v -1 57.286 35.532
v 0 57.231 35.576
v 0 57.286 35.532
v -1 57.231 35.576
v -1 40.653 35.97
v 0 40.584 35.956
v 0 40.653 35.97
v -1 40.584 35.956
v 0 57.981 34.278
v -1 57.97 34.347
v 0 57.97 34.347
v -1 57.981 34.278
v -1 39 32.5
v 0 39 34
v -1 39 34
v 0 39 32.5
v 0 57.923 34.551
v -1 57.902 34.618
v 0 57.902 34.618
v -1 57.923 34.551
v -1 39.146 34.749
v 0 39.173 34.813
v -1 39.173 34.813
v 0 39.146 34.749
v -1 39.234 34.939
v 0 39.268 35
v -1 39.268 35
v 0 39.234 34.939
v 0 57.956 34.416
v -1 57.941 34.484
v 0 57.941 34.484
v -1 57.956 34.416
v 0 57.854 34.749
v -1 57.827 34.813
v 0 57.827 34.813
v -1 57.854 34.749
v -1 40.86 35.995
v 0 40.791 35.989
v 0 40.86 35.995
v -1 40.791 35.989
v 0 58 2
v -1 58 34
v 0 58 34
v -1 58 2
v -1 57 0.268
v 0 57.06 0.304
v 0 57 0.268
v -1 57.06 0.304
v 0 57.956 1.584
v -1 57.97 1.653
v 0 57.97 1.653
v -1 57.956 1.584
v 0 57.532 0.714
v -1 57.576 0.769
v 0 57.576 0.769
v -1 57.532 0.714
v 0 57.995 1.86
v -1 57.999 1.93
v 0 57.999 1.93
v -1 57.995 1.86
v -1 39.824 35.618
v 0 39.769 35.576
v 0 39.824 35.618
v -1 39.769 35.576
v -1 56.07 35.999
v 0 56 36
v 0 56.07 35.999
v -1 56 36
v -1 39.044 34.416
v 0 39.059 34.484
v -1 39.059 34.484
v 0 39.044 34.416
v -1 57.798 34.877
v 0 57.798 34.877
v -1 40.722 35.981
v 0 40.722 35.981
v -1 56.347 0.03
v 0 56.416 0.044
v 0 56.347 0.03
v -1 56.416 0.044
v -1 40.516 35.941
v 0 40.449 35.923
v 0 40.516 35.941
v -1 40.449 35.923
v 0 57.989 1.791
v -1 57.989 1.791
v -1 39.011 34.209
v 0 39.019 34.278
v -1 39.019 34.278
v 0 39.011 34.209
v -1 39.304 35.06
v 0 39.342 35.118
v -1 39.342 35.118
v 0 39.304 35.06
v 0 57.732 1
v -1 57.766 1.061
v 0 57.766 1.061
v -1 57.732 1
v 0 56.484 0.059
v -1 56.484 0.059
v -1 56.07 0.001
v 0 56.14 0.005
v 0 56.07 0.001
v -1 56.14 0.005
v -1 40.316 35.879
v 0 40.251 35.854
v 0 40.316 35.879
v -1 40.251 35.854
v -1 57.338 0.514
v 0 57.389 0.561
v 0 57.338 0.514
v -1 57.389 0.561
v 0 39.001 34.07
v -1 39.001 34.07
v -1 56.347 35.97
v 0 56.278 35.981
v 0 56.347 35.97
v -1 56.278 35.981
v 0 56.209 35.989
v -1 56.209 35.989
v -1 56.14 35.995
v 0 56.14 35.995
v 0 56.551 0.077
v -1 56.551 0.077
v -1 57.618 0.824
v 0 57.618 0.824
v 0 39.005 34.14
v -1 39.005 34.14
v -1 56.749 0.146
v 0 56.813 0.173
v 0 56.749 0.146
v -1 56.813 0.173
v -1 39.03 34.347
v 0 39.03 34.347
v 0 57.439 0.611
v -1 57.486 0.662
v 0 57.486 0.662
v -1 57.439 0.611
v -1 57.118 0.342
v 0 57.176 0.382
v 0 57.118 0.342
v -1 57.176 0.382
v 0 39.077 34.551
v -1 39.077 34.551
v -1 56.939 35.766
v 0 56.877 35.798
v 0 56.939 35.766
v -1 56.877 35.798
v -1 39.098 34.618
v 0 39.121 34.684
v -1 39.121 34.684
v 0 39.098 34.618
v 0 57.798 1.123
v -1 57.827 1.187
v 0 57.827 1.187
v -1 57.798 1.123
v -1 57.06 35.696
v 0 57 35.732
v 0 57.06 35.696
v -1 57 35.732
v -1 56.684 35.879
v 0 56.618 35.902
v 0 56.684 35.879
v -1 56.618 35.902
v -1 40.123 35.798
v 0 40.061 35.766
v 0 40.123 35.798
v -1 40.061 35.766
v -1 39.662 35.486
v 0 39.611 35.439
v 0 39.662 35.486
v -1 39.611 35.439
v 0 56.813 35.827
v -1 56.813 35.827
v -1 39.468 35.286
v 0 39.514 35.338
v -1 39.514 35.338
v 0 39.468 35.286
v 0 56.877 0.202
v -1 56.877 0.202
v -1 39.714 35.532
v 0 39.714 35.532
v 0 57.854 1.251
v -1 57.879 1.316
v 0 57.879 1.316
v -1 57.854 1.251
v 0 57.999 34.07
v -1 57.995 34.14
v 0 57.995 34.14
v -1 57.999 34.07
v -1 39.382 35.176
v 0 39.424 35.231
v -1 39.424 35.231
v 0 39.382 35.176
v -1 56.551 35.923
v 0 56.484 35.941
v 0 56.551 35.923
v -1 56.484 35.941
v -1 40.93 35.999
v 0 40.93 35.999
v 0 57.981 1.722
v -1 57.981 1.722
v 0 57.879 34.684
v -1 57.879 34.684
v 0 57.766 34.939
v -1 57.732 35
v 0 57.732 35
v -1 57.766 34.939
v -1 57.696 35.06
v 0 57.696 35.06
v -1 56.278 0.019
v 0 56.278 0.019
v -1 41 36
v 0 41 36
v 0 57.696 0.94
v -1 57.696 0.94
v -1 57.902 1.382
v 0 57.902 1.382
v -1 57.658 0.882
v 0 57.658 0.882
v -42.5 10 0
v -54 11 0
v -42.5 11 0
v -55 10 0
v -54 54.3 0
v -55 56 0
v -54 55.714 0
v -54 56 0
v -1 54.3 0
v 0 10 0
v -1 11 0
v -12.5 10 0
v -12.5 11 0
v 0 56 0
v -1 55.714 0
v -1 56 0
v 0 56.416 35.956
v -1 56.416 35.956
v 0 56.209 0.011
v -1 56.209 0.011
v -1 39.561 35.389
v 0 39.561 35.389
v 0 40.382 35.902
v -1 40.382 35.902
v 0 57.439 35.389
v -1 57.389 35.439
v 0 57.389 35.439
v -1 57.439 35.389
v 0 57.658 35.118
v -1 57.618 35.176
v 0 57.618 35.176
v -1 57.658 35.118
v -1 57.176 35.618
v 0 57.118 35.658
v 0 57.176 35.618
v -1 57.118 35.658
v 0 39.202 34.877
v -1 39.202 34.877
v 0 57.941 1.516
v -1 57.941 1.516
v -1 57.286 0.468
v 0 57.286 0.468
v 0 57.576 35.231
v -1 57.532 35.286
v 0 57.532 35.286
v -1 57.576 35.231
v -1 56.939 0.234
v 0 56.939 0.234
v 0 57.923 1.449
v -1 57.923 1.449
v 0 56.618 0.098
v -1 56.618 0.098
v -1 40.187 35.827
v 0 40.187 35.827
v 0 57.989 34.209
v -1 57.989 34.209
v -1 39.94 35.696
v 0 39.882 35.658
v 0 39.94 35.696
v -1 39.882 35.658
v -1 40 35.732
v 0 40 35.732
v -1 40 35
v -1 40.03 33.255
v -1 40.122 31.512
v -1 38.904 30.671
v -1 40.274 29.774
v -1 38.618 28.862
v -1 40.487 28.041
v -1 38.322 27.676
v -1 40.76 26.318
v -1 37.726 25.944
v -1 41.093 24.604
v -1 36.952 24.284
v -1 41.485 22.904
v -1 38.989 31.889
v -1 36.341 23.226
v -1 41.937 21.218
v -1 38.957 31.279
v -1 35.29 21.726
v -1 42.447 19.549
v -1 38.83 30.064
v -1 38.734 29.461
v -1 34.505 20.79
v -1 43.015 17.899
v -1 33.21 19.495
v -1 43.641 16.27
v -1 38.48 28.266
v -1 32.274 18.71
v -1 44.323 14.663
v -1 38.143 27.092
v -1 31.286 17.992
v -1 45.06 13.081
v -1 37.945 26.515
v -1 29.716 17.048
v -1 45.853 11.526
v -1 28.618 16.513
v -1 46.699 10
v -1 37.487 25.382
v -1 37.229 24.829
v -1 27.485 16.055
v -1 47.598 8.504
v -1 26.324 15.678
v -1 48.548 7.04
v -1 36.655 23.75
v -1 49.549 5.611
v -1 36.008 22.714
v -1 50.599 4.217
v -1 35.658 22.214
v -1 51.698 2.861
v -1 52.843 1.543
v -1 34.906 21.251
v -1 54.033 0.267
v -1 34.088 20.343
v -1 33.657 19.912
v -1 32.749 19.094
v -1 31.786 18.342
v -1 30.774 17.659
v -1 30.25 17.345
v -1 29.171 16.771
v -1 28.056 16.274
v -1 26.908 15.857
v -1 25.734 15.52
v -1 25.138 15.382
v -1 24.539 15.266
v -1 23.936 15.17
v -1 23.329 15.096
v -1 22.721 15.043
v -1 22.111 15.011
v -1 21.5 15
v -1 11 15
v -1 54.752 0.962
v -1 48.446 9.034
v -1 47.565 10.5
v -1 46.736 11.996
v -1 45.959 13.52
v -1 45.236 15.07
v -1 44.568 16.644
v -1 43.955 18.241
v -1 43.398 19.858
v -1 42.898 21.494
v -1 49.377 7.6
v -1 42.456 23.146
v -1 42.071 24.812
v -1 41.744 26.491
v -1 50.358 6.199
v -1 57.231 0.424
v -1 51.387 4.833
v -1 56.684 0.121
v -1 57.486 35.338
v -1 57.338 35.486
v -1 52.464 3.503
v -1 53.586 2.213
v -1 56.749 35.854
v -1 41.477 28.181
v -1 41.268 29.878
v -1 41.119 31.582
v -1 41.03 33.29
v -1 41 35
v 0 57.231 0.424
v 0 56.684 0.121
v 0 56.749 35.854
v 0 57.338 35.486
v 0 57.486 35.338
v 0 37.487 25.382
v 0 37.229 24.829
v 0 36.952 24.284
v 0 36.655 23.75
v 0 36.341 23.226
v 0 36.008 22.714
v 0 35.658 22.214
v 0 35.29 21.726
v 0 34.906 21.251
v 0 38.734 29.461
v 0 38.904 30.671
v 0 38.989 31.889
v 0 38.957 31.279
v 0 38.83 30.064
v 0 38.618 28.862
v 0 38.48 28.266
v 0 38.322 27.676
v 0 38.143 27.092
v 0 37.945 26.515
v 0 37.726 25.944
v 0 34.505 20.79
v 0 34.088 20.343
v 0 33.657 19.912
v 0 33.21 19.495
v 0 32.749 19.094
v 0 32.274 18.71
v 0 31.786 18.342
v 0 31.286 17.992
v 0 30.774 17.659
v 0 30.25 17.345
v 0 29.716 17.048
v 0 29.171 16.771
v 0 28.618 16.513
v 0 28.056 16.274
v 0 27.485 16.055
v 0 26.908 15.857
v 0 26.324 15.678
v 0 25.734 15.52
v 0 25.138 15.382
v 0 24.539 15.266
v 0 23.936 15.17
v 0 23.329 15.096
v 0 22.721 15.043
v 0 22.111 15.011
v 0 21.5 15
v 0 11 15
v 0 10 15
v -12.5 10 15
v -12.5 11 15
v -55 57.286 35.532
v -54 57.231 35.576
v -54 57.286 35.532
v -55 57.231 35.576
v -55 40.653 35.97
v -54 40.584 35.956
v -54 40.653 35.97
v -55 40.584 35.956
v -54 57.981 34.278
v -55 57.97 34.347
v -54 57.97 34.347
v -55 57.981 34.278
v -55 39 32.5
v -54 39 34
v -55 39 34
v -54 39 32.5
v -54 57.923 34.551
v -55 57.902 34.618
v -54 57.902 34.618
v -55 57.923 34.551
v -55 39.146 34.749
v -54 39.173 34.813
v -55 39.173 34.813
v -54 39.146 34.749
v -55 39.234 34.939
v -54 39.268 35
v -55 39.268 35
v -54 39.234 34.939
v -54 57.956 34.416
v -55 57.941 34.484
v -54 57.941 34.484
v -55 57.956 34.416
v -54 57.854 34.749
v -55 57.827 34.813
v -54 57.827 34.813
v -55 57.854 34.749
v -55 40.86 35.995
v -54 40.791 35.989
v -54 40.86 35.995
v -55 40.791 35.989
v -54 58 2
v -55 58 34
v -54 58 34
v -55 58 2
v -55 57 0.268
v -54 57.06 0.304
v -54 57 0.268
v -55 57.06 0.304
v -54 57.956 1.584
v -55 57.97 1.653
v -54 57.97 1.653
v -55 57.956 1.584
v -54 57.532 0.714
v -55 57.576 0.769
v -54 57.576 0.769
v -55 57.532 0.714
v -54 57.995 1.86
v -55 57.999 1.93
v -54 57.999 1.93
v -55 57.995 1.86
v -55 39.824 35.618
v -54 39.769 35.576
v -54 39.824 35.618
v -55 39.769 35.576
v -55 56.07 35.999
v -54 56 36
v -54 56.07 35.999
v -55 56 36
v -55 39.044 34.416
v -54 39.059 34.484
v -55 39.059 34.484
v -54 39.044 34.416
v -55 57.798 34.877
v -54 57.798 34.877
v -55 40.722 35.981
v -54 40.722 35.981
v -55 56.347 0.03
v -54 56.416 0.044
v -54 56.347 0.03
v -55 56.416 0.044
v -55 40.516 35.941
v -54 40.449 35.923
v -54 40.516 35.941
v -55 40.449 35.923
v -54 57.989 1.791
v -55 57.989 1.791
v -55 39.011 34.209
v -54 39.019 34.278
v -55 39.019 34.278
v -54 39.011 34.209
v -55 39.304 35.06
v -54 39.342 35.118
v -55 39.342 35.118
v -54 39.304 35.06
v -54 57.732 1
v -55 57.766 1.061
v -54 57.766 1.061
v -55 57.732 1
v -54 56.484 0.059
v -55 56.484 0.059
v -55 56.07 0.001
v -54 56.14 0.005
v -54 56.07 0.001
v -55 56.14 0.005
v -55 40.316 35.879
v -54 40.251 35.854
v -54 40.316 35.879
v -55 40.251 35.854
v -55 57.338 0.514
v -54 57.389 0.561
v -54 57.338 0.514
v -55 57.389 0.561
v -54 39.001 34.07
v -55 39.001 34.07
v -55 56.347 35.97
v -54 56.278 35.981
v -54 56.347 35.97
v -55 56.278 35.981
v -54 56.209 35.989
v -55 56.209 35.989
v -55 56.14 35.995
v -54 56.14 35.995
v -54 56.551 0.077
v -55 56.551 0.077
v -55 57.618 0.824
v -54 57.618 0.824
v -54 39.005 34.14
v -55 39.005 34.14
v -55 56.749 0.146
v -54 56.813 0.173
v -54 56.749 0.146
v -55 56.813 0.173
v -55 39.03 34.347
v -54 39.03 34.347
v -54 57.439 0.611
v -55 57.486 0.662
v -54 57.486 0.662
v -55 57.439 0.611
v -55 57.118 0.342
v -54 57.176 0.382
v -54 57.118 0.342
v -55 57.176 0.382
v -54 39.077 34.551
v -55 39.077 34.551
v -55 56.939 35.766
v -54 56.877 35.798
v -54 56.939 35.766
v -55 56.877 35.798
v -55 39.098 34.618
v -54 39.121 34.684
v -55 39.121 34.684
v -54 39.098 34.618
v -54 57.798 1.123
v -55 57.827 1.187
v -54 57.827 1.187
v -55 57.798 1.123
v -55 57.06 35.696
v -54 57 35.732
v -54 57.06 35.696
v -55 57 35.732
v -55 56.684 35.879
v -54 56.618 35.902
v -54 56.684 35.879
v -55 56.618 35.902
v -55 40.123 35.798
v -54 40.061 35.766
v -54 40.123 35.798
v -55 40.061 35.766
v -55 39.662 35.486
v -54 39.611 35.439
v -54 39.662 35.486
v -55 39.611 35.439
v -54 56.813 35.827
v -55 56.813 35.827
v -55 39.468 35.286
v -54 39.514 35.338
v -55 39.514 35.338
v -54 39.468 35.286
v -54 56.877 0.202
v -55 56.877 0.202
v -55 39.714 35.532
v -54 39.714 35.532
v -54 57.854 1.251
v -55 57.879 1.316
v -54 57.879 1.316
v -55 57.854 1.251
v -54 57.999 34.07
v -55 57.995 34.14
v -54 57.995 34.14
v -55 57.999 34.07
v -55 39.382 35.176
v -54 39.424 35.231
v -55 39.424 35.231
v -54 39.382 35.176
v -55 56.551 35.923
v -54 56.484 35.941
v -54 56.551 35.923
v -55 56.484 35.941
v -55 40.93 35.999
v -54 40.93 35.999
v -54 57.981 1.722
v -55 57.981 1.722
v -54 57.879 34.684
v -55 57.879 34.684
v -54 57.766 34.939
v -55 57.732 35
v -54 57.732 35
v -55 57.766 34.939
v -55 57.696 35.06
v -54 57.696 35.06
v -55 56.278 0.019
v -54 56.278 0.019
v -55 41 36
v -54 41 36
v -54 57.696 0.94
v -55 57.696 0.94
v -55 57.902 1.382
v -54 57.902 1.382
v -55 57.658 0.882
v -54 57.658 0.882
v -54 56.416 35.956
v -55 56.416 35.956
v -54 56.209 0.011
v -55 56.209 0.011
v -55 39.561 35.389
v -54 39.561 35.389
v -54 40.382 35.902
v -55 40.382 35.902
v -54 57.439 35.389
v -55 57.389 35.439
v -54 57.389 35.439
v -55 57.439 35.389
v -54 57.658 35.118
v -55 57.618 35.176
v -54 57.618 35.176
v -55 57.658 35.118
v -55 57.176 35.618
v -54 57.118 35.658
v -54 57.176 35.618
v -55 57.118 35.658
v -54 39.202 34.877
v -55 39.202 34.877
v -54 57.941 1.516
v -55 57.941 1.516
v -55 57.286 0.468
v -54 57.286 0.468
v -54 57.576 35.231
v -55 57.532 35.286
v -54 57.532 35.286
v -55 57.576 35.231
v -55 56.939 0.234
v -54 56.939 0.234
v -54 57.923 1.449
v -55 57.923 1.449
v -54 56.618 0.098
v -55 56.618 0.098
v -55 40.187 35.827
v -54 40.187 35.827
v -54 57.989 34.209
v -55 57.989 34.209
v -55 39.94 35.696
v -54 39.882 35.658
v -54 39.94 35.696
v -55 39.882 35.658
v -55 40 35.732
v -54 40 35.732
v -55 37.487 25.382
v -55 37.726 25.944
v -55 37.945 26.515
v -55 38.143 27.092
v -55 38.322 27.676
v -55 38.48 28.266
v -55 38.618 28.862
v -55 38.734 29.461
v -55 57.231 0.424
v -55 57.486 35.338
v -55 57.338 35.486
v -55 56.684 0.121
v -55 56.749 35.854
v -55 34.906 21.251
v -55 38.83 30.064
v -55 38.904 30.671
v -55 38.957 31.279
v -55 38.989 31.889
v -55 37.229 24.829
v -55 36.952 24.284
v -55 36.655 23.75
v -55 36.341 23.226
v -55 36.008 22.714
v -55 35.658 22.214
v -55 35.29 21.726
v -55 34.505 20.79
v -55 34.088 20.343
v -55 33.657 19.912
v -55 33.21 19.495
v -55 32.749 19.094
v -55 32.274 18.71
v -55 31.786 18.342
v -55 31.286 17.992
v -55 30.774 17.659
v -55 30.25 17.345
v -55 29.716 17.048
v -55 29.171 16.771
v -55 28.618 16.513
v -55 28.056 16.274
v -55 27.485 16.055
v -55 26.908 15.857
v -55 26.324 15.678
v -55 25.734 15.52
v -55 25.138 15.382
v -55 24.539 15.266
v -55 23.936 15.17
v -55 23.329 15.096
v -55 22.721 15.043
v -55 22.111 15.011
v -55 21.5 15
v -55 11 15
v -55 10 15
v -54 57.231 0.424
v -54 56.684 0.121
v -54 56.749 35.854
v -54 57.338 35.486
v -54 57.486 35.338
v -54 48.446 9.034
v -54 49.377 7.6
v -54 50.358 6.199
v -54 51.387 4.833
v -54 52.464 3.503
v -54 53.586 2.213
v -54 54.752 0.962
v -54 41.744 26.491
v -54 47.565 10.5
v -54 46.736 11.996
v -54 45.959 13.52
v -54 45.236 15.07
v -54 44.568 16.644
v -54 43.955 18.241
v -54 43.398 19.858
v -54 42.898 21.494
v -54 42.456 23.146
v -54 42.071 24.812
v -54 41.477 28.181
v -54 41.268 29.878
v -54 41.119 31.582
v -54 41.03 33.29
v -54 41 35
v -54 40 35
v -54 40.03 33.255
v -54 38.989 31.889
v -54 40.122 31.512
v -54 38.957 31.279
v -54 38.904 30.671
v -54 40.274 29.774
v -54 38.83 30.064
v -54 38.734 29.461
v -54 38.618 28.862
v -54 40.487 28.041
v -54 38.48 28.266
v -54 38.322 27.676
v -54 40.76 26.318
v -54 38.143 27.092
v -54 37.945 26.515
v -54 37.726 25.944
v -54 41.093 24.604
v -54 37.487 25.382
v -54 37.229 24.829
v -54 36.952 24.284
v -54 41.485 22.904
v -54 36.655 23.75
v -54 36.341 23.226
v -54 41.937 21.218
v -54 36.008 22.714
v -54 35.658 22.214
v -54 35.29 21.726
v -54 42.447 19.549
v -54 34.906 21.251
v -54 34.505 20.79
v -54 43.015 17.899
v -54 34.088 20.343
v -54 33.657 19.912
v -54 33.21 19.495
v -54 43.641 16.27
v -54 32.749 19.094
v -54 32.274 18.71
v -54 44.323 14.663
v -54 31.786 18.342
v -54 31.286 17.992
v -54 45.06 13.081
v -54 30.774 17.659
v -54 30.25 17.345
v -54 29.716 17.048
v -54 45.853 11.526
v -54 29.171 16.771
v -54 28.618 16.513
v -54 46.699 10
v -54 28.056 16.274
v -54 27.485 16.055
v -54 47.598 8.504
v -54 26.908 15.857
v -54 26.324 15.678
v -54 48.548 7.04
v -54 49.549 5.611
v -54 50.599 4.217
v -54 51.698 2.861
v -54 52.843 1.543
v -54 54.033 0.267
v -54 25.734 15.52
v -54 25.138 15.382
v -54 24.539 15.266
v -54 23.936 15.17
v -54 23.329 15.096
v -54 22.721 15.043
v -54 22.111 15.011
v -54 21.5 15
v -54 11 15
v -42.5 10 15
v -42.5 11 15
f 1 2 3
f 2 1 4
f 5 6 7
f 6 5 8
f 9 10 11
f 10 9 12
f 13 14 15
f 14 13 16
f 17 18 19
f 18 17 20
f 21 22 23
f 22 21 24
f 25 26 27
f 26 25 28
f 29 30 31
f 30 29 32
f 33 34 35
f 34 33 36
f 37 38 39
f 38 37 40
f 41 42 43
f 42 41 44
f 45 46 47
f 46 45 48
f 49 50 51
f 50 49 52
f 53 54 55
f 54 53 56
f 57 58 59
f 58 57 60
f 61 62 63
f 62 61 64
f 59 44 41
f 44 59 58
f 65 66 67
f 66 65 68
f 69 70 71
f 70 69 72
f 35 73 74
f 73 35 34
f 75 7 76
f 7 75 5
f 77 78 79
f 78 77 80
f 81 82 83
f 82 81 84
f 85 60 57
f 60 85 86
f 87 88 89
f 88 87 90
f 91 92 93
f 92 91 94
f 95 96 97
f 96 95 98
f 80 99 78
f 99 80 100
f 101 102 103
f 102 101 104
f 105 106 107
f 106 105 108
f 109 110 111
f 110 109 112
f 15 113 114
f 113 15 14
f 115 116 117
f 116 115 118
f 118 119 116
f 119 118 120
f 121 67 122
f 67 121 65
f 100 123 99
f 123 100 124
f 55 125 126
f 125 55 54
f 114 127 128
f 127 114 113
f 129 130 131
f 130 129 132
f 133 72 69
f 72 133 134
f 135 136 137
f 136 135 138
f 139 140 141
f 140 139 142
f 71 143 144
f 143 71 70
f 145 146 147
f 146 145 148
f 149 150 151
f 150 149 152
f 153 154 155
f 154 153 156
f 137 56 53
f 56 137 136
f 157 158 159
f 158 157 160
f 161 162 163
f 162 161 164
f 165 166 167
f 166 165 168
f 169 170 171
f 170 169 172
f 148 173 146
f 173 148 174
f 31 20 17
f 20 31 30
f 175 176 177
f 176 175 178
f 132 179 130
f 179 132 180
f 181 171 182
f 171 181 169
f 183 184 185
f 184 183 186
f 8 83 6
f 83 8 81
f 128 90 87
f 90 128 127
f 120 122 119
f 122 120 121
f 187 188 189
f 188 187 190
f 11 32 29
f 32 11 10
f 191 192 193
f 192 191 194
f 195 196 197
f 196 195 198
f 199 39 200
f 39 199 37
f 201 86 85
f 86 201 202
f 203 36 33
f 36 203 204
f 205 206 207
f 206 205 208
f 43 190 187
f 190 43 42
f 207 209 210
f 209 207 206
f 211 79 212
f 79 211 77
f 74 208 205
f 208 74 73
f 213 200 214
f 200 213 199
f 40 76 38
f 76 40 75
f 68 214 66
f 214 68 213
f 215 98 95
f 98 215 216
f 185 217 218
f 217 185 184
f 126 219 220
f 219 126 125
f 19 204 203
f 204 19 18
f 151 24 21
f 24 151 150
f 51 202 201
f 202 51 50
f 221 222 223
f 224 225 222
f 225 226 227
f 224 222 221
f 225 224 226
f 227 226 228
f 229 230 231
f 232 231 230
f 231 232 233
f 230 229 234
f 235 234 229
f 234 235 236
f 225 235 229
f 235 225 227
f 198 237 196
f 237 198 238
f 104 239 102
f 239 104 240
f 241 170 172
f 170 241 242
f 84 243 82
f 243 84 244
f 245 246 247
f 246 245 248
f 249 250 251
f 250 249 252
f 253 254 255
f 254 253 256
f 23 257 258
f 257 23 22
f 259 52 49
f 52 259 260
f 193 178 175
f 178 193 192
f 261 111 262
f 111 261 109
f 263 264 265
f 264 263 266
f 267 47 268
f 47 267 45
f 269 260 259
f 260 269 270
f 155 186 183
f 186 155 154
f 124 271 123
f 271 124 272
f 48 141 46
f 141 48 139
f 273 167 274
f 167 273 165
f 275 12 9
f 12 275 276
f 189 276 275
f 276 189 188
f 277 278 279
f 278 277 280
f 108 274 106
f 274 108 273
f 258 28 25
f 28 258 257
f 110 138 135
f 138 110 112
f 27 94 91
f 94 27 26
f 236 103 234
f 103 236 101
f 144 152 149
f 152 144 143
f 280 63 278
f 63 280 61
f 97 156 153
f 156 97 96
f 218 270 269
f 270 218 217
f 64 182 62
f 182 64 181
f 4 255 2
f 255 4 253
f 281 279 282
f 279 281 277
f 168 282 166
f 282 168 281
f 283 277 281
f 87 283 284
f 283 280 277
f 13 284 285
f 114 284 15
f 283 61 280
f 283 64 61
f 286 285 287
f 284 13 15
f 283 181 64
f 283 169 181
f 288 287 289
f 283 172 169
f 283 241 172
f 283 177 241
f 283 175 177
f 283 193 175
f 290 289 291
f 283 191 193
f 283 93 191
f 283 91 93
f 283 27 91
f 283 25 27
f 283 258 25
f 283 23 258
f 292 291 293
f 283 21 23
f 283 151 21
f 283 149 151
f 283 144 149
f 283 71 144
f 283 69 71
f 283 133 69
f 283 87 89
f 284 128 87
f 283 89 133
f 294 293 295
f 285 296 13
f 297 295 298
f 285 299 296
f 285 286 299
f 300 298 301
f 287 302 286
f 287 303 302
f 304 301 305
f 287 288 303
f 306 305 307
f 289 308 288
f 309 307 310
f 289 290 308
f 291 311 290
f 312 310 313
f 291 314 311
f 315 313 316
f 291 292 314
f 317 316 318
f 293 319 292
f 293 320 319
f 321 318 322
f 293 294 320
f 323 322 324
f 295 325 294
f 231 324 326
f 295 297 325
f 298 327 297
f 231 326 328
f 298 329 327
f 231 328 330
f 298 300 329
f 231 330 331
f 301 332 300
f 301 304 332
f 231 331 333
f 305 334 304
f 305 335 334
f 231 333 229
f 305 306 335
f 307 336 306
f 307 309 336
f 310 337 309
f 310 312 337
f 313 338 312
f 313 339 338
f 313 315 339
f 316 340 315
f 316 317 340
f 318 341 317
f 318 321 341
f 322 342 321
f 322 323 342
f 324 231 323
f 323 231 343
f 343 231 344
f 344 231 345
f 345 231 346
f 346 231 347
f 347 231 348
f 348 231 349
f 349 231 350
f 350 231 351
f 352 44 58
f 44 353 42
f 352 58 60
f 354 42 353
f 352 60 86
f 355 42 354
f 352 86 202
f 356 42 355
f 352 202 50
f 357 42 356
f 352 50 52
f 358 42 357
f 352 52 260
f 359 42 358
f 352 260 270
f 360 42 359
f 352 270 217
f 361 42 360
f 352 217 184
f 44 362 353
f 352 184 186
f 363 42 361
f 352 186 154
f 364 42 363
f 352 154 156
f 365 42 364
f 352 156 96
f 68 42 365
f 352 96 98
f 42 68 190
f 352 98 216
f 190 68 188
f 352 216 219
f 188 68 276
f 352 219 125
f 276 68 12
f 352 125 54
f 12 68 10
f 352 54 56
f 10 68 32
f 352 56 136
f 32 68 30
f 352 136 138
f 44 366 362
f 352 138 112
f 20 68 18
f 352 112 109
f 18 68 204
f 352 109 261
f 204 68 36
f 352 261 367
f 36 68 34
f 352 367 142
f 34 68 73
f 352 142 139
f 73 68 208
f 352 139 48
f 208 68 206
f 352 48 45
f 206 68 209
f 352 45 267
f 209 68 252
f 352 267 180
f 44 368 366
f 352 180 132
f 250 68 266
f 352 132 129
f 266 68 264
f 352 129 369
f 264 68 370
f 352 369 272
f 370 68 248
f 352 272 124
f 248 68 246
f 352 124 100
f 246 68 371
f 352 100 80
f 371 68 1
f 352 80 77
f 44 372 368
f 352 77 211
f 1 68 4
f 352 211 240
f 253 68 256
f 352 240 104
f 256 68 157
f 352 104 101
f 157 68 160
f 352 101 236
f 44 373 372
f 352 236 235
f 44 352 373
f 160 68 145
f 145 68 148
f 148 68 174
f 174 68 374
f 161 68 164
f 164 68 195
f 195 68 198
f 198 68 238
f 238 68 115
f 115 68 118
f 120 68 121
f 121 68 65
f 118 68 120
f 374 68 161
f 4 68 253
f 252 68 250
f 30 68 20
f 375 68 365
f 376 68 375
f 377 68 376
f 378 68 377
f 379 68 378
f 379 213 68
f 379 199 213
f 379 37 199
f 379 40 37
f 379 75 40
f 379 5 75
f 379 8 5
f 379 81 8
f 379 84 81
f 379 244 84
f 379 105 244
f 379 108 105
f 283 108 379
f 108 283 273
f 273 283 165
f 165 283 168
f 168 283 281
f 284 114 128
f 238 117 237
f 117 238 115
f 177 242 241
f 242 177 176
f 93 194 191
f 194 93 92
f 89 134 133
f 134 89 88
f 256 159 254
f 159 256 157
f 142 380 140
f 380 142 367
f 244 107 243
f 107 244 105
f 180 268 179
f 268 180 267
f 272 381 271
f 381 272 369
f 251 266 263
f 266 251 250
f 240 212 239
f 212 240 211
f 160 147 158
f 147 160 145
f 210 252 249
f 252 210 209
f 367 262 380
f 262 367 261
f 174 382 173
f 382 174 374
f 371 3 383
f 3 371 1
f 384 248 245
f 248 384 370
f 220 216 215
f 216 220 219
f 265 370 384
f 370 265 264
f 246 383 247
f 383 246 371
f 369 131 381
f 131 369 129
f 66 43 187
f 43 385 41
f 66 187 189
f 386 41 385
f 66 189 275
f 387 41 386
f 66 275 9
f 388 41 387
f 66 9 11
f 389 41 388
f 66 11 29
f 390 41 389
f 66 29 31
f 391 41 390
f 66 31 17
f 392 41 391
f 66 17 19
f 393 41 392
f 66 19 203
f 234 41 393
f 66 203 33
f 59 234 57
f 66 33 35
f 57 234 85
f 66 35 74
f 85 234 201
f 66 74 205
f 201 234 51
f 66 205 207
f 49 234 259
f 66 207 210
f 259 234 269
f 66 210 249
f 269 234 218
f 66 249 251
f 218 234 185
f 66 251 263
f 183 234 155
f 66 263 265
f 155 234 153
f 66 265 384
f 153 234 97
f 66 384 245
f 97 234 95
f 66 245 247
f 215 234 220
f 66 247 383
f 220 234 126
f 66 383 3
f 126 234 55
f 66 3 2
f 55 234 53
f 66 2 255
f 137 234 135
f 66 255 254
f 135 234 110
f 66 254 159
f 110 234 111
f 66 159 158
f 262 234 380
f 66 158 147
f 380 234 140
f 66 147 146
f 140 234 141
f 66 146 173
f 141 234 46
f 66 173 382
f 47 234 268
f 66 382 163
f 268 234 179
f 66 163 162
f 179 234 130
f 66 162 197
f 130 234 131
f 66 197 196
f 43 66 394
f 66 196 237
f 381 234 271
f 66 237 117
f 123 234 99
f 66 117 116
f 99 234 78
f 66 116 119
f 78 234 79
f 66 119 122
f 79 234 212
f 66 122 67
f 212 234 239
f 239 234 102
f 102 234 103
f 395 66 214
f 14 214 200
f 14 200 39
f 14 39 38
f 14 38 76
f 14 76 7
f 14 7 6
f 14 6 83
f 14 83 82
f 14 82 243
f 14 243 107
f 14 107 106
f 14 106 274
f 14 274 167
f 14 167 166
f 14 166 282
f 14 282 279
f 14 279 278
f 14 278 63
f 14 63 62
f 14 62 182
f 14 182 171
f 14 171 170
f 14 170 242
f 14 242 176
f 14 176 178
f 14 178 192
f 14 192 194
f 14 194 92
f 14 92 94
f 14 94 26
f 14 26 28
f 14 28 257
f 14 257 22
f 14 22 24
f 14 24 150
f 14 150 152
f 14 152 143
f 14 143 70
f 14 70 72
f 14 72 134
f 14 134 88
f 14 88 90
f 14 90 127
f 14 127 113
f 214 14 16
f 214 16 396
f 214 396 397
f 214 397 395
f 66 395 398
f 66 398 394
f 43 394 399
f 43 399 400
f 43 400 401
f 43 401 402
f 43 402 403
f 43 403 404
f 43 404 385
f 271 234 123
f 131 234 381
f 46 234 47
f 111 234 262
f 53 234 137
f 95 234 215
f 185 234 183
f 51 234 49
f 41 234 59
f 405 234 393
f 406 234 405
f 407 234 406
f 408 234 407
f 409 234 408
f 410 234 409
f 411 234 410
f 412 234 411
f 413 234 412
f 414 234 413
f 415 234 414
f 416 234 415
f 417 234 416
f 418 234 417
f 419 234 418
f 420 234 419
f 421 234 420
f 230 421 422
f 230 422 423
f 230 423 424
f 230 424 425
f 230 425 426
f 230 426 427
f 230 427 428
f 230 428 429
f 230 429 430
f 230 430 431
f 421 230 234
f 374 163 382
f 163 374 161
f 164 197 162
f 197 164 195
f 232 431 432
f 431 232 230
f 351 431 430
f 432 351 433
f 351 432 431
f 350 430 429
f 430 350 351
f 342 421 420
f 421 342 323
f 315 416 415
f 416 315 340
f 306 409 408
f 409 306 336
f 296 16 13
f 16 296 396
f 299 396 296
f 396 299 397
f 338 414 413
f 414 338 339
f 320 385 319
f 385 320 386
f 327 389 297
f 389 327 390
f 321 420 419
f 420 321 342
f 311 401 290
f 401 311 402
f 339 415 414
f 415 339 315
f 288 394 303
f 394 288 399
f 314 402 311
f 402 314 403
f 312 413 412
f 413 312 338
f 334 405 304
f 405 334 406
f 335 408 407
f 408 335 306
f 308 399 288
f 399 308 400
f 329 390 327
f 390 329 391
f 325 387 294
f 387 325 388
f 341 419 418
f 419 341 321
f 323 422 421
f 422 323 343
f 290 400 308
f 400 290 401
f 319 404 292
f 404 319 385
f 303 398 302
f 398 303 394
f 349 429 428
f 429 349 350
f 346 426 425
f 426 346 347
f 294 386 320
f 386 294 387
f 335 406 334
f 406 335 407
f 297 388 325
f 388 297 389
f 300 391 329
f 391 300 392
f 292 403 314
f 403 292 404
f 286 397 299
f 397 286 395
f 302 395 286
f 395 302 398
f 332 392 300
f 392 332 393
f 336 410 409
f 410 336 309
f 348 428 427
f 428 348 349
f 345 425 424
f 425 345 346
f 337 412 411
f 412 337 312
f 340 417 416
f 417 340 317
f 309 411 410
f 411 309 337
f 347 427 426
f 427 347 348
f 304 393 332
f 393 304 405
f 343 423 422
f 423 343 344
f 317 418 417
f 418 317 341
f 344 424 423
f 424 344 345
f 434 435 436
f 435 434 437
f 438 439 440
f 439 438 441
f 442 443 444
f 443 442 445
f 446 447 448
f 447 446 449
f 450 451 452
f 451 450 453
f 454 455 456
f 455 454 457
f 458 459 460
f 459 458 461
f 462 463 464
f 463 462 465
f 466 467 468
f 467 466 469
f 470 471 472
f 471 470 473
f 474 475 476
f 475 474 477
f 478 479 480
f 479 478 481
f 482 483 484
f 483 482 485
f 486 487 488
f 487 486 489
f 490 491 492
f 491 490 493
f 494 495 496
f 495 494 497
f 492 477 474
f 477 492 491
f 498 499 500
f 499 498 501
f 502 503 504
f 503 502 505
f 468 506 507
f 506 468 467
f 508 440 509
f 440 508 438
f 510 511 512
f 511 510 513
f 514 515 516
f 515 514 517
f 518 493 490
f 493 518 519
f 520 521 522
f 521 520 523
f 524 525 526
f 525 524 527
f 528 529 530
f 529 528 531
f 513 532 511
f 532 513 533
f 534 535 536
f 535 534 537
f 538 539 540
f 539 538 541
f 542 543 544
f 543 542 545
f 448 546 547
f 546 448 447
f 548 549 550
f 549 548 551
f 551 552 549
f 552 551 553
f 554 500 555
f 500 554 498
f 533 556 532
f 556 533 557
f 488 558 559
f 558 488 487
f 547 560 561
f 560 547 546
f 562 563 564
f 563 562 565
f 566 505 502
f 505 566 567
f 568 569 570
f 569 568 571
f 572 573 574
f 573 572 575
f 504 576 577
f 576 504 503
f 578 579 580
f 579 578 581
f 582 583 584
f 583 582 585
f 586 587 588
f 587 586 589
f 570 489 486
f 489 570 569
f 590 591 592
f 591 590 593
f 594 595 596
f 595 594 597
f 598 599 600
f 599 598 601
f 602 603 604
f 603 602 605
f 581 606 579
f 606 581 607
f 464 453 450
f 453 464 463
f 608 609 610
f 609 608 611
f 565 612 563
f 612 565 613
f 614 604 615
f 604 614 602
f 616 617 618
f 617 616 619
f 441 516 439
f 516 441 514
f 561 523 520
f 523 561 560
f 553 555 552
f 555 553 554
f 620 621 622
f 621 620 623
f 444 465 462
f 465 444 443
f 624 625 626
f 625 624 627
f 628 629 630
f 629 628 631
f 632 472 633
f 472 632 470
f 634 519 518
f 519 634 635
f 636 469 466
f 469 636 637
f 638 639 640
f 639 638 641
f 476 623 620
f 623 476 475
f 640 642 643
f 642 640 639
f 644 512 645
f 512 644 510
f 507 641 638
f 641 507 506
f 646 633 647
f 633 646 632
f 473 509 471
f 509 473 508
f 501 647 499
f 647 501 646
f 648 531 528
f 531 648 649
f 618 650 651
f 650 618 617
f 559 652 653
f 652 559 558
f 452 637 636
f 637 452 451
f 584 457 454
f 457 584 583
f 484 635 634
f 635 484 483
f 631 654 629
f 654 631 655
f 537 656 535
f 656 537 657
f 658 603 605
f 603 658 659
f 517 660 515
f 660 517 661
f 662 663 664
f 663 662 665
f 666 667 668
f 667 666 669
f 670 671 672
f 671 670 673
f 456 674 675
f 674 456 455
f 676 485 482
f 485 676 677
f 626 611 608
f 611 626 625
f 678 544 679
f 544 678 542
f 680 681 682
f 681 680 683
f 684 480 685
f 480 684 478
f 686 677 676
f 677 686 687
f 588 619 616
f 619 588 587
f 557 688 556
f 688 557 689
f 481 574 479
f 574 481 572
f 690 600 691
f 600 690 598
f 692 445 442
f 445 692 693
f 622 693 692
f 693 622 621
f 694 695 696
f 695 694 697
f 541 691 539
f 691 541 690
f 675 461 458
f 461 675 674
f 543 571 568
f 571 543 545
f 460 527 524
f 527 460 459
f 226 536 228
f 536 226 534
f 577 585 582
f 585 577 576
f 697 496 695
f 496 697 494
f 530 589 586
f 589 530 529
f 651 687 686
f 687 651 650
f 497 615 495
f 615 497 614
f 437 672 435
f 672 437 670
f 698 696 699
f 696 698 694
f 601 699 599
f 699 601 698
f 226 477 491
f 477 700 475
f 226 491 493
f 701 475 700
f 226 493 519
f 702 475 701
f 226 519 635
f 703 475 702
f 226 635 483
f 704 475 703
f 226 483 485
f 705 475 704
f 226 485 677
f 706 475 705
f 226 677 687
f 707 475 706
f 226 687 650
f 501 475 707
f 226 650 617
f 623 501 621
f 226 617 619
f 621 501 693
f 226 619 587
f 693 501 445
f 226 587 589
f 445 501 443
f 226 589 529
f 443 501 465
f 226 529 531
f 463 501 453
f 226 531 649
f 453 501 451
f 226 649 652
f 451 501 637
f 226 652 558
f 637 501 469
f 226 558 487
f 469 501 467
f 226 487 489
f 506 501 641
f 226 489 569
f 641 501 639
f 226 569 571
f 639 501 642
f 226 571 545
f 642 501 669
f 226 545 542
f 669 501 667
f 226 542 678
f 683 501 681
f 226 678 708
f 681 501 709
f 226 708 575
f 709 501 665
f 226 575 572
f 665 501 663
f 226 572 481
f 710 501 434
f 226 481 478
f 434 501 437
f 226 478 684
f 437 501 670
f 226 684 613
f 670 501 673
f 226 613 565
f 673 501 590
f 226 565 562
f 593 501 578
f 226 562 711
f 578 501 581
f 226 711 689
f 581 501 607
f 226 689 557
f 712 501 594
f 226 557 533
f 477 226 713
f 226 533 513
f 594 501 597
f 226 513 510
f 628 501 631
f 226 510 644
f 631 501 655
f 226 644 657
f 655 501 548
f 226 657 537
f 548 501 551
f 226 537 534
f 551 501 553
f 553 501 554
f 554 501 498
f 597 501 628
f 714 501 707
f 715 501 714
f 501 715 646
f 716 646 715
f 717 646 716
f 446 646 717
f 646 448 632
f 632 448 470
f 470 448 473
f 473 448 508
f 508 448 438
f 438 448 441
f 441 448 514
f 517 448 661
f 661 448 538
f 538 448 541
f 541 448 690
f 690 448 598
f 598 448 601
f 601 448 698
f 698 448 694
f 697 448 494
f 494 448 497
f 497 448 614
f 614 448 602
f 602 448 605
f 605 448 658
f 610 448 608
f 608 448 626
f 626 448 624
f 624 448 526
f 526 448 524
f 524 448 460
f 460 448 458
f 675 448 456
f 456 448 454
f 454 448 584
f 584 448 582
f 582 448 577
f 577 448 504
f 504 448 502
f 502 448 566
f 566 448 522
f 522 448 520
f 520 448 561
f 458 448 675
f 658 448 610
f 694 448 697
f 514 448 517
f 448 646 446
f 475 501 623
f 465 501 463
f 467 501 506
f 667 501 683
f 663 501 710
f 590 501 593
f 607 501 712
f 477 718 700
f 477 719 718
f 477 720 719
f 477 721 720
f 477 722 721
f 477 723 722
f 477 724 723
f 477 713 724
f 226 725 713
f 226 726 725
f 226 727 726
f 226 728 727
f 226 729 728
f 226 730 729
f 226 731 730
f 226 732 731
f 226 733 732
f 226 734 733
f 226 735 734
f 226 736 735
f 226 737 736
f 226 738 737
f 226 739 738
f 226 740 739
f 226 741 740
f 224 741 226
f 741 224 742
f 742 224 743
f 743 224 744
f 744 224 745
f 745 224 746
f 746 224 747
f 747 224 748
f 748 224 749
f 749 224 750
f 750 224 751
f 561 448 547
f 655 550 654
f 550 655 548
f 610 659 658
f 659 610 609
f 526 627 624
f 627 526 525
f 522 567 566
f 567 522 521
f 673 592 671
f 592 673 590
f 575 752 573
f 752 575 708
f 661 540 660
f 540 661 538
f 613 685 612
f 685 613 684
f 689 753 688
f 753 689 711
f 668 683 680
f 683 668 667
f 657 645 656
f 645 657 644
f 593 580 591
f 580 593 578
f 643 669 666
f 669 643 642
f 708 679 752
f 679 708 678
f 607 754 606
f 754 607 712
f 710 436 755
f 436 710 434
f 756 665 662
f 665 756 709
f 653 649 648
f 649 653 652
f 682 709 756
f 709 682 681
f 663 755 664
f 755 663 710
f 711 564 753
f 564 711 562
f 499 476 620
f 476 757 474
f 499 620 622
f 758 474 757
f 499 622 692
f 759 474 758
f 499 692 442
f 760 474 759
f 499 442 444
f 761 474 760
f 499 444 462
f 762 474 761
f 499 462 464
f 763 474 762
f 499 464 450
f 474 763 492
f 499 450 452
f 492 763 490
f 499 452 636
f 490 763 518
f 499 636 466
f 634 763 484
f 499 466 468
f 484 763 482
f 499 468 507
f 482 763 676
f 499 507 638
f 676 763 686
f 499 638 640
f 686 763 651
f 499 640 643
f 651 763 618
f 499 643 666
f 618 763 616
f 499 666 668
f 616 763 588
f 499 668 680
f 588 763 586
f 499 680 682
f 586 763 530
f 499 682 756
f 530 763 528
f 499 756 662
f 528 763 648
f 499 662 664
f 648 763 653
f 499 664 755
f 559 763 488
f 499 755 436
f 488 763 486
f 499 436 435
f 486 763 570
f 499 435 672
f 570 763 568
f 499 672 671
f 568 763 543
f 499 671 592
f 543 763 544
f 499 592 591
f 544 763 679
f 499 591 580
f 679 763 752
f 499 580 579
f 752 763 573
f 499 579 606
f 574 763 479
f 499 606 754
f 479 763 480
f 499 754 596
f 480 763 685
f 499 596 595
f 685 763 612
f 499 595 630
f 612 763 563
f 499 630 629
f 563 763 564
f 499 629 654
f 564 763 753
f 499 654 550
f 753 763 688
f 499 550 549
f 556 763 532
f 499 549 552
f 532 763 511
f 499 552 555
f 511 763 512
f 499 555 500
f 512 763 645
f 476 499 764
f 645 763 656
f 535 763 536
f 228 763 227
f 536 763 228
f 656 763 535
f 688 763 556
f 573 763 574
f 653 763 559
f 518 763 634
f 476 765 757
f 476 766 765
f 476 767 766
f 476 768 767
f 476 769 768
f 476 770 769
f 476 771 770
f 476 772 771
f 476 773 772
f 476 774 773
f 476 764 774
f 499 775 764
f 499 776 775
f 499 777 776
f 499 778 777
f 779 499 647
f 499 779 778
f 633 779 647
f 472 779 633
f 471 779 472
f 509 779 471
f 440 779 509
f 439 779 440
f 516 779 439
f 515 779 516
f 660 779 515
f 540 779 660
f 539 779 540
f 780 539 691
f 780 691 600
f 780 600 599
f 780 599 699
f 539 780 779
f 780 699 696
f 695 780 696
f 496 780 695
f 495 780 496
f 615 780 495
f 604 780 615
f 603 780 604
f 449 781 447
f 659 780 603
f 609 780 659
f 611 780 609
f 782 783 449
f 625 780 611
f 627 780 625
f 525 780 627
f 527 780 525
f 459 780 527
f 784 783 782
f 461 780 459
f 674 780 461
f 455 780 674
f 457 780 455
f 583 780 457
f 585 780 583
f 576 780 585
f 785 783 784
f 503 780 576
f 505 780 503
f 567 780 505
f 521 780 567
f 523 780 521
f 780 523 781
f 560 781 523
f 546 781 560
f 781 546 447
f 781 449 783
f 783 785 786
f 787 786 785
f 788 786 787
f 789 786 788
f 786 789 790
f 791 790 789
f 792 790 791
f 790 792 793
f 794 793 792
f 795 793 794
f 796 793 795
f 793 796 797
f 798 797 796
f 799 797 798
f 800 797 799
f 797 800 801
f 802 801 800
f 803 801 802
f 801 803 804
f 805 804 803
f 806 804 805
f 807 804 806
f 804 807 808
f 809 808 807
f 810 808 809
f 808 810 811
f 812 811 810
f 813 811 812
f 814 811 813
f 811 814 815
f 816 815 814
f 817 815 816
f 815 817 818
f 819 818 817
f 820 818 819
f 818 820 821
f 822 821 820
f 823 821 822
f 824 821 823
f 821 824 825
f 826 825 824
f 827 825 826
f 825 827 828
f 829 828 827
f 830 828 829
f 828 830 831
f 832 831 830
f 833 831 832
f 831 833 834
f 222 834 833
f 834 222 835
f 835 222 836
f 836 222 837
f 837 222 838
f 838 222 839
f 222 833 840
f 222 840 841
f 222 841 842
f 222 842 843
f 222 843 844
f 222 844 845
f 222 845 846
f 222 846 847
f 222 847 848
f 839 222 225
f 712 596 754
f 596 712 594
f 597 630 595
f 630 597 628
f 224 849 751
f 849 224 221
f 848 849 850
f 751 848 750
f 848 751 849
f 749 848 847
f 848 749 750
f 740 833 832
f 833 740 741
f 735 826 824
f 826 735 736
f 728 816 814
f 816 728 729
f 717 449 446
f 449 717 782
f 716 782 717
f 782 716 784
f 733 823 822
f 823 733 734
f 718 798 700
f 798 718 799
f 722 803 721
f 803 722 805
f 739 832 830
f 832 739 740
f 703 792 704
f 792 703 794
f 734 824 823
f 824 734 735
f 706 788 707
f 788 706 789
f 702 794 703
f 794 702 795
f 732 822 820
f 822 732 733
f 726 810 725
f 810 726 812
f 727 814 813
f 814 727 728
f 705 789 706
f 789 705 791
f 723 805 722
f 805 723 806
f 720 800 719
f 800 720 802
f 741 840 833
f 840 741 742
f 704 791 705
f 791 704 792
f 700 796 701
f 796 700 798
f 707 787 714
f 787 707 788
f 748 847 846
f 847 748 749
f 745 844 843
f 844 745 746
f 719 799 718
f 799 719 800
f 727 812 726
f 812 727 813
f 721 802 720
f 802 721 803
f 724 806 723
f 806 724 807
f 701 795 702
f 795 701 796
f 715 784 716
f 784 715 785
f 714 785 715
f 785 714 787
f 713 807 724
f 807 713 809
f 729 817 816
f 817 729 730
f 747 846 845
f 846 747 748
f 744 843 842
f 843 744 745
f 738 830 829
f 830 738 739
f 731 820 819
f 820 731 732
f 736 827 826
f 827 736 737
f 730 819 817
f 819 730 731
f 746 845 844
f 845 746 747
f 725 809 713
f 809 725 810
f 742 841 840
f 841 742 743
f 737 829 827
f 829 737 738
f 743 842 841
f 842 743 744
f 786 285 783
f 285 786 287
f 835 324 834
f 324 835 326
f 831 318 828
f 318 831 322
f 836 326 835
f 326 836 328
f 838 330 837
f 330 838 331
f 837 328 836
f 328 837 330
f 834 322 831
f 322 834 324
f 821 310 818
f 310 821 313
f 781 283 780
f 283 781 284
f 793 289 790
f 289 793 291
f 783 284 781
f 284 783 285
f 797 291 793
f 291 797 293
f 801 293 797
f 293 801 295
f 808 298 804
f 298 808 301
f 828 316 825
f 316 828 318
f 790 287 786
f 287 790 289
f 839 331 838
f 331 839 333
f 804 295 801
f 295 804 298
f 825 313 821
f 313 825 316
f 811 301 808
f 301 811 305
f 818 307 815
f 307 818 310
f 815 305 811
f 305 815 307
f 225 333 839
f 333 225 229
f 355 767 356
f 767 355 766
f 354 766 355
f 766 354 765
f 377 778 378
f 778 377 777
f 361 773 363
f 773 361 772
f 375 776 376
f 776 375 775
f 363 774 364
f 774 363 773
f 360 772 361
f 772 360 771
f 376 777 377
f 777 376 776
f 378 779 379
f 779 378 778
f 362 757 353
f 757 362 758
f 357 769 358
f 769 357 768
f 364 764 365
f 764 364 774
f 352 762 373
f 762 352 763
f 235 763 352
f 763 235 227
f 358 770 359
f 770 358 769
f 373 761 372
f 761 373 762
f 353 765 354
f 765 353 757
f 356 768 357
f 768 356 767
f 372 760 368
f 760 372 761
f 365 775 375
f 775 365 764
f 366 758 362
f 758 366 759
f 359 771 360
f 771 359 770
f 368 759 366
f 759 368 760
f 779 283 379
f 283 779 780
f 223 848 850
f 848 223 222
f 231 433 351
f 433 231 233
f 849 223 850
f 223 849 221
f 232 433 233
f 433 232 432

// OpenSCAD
rotate([0,-90,0])
{
$fn=180;

difference(){
union(){
translate([2,41,0])
minkowski()
{
 cube([32,15,.5]);
 cylinder(r=2,h=.5);
}
translate([0,10,0])cube([32.5,32,1]);
}
translate([15,-1,-1])cube([25,22.5,3]);
translate([32.5,21.5,-1])cylinder(d=35,h=3);
}

translate([0,0,54])
difference(){
union(){
translate([2,41,0])
minkowski()
{
 cube([32,15,.5]);
 cylinder(r=2,h=.5);
}
translate([0,10,0])cube([32.5,32,1]);
}
translate([15,-1,-1])cube([25,22.5,3]);
translate([32.5,21.5,-1])cylinder(d=35,h=3);
}

translate([0,0,55])
rotate([0,180,0])
translate([-35,90,0])
difference(){
cylinder(r=50,h=55);
translate([0,0,-1])cylinder(r=49,h=57);
translate([-100,0,0])cube([200,200,200],center=true);
translate([135,0,0])cube([200,200,200],center=true);
translate([0,100,0])cube([200,200,200],center=true);    
}

translate([0,10,0])
difference(){
cube([15,1,55]);
//translate([7.5,-1,5])rotate([-90,0,0])
//    cylinder(d=3.5,h=4);
//translate([7.5,-1,50])rotate([-90,0,0])
//    cylinder(d=3.5,h=4);
translate([-1,-1,12.5])cube([30,30,30]);
}
}
